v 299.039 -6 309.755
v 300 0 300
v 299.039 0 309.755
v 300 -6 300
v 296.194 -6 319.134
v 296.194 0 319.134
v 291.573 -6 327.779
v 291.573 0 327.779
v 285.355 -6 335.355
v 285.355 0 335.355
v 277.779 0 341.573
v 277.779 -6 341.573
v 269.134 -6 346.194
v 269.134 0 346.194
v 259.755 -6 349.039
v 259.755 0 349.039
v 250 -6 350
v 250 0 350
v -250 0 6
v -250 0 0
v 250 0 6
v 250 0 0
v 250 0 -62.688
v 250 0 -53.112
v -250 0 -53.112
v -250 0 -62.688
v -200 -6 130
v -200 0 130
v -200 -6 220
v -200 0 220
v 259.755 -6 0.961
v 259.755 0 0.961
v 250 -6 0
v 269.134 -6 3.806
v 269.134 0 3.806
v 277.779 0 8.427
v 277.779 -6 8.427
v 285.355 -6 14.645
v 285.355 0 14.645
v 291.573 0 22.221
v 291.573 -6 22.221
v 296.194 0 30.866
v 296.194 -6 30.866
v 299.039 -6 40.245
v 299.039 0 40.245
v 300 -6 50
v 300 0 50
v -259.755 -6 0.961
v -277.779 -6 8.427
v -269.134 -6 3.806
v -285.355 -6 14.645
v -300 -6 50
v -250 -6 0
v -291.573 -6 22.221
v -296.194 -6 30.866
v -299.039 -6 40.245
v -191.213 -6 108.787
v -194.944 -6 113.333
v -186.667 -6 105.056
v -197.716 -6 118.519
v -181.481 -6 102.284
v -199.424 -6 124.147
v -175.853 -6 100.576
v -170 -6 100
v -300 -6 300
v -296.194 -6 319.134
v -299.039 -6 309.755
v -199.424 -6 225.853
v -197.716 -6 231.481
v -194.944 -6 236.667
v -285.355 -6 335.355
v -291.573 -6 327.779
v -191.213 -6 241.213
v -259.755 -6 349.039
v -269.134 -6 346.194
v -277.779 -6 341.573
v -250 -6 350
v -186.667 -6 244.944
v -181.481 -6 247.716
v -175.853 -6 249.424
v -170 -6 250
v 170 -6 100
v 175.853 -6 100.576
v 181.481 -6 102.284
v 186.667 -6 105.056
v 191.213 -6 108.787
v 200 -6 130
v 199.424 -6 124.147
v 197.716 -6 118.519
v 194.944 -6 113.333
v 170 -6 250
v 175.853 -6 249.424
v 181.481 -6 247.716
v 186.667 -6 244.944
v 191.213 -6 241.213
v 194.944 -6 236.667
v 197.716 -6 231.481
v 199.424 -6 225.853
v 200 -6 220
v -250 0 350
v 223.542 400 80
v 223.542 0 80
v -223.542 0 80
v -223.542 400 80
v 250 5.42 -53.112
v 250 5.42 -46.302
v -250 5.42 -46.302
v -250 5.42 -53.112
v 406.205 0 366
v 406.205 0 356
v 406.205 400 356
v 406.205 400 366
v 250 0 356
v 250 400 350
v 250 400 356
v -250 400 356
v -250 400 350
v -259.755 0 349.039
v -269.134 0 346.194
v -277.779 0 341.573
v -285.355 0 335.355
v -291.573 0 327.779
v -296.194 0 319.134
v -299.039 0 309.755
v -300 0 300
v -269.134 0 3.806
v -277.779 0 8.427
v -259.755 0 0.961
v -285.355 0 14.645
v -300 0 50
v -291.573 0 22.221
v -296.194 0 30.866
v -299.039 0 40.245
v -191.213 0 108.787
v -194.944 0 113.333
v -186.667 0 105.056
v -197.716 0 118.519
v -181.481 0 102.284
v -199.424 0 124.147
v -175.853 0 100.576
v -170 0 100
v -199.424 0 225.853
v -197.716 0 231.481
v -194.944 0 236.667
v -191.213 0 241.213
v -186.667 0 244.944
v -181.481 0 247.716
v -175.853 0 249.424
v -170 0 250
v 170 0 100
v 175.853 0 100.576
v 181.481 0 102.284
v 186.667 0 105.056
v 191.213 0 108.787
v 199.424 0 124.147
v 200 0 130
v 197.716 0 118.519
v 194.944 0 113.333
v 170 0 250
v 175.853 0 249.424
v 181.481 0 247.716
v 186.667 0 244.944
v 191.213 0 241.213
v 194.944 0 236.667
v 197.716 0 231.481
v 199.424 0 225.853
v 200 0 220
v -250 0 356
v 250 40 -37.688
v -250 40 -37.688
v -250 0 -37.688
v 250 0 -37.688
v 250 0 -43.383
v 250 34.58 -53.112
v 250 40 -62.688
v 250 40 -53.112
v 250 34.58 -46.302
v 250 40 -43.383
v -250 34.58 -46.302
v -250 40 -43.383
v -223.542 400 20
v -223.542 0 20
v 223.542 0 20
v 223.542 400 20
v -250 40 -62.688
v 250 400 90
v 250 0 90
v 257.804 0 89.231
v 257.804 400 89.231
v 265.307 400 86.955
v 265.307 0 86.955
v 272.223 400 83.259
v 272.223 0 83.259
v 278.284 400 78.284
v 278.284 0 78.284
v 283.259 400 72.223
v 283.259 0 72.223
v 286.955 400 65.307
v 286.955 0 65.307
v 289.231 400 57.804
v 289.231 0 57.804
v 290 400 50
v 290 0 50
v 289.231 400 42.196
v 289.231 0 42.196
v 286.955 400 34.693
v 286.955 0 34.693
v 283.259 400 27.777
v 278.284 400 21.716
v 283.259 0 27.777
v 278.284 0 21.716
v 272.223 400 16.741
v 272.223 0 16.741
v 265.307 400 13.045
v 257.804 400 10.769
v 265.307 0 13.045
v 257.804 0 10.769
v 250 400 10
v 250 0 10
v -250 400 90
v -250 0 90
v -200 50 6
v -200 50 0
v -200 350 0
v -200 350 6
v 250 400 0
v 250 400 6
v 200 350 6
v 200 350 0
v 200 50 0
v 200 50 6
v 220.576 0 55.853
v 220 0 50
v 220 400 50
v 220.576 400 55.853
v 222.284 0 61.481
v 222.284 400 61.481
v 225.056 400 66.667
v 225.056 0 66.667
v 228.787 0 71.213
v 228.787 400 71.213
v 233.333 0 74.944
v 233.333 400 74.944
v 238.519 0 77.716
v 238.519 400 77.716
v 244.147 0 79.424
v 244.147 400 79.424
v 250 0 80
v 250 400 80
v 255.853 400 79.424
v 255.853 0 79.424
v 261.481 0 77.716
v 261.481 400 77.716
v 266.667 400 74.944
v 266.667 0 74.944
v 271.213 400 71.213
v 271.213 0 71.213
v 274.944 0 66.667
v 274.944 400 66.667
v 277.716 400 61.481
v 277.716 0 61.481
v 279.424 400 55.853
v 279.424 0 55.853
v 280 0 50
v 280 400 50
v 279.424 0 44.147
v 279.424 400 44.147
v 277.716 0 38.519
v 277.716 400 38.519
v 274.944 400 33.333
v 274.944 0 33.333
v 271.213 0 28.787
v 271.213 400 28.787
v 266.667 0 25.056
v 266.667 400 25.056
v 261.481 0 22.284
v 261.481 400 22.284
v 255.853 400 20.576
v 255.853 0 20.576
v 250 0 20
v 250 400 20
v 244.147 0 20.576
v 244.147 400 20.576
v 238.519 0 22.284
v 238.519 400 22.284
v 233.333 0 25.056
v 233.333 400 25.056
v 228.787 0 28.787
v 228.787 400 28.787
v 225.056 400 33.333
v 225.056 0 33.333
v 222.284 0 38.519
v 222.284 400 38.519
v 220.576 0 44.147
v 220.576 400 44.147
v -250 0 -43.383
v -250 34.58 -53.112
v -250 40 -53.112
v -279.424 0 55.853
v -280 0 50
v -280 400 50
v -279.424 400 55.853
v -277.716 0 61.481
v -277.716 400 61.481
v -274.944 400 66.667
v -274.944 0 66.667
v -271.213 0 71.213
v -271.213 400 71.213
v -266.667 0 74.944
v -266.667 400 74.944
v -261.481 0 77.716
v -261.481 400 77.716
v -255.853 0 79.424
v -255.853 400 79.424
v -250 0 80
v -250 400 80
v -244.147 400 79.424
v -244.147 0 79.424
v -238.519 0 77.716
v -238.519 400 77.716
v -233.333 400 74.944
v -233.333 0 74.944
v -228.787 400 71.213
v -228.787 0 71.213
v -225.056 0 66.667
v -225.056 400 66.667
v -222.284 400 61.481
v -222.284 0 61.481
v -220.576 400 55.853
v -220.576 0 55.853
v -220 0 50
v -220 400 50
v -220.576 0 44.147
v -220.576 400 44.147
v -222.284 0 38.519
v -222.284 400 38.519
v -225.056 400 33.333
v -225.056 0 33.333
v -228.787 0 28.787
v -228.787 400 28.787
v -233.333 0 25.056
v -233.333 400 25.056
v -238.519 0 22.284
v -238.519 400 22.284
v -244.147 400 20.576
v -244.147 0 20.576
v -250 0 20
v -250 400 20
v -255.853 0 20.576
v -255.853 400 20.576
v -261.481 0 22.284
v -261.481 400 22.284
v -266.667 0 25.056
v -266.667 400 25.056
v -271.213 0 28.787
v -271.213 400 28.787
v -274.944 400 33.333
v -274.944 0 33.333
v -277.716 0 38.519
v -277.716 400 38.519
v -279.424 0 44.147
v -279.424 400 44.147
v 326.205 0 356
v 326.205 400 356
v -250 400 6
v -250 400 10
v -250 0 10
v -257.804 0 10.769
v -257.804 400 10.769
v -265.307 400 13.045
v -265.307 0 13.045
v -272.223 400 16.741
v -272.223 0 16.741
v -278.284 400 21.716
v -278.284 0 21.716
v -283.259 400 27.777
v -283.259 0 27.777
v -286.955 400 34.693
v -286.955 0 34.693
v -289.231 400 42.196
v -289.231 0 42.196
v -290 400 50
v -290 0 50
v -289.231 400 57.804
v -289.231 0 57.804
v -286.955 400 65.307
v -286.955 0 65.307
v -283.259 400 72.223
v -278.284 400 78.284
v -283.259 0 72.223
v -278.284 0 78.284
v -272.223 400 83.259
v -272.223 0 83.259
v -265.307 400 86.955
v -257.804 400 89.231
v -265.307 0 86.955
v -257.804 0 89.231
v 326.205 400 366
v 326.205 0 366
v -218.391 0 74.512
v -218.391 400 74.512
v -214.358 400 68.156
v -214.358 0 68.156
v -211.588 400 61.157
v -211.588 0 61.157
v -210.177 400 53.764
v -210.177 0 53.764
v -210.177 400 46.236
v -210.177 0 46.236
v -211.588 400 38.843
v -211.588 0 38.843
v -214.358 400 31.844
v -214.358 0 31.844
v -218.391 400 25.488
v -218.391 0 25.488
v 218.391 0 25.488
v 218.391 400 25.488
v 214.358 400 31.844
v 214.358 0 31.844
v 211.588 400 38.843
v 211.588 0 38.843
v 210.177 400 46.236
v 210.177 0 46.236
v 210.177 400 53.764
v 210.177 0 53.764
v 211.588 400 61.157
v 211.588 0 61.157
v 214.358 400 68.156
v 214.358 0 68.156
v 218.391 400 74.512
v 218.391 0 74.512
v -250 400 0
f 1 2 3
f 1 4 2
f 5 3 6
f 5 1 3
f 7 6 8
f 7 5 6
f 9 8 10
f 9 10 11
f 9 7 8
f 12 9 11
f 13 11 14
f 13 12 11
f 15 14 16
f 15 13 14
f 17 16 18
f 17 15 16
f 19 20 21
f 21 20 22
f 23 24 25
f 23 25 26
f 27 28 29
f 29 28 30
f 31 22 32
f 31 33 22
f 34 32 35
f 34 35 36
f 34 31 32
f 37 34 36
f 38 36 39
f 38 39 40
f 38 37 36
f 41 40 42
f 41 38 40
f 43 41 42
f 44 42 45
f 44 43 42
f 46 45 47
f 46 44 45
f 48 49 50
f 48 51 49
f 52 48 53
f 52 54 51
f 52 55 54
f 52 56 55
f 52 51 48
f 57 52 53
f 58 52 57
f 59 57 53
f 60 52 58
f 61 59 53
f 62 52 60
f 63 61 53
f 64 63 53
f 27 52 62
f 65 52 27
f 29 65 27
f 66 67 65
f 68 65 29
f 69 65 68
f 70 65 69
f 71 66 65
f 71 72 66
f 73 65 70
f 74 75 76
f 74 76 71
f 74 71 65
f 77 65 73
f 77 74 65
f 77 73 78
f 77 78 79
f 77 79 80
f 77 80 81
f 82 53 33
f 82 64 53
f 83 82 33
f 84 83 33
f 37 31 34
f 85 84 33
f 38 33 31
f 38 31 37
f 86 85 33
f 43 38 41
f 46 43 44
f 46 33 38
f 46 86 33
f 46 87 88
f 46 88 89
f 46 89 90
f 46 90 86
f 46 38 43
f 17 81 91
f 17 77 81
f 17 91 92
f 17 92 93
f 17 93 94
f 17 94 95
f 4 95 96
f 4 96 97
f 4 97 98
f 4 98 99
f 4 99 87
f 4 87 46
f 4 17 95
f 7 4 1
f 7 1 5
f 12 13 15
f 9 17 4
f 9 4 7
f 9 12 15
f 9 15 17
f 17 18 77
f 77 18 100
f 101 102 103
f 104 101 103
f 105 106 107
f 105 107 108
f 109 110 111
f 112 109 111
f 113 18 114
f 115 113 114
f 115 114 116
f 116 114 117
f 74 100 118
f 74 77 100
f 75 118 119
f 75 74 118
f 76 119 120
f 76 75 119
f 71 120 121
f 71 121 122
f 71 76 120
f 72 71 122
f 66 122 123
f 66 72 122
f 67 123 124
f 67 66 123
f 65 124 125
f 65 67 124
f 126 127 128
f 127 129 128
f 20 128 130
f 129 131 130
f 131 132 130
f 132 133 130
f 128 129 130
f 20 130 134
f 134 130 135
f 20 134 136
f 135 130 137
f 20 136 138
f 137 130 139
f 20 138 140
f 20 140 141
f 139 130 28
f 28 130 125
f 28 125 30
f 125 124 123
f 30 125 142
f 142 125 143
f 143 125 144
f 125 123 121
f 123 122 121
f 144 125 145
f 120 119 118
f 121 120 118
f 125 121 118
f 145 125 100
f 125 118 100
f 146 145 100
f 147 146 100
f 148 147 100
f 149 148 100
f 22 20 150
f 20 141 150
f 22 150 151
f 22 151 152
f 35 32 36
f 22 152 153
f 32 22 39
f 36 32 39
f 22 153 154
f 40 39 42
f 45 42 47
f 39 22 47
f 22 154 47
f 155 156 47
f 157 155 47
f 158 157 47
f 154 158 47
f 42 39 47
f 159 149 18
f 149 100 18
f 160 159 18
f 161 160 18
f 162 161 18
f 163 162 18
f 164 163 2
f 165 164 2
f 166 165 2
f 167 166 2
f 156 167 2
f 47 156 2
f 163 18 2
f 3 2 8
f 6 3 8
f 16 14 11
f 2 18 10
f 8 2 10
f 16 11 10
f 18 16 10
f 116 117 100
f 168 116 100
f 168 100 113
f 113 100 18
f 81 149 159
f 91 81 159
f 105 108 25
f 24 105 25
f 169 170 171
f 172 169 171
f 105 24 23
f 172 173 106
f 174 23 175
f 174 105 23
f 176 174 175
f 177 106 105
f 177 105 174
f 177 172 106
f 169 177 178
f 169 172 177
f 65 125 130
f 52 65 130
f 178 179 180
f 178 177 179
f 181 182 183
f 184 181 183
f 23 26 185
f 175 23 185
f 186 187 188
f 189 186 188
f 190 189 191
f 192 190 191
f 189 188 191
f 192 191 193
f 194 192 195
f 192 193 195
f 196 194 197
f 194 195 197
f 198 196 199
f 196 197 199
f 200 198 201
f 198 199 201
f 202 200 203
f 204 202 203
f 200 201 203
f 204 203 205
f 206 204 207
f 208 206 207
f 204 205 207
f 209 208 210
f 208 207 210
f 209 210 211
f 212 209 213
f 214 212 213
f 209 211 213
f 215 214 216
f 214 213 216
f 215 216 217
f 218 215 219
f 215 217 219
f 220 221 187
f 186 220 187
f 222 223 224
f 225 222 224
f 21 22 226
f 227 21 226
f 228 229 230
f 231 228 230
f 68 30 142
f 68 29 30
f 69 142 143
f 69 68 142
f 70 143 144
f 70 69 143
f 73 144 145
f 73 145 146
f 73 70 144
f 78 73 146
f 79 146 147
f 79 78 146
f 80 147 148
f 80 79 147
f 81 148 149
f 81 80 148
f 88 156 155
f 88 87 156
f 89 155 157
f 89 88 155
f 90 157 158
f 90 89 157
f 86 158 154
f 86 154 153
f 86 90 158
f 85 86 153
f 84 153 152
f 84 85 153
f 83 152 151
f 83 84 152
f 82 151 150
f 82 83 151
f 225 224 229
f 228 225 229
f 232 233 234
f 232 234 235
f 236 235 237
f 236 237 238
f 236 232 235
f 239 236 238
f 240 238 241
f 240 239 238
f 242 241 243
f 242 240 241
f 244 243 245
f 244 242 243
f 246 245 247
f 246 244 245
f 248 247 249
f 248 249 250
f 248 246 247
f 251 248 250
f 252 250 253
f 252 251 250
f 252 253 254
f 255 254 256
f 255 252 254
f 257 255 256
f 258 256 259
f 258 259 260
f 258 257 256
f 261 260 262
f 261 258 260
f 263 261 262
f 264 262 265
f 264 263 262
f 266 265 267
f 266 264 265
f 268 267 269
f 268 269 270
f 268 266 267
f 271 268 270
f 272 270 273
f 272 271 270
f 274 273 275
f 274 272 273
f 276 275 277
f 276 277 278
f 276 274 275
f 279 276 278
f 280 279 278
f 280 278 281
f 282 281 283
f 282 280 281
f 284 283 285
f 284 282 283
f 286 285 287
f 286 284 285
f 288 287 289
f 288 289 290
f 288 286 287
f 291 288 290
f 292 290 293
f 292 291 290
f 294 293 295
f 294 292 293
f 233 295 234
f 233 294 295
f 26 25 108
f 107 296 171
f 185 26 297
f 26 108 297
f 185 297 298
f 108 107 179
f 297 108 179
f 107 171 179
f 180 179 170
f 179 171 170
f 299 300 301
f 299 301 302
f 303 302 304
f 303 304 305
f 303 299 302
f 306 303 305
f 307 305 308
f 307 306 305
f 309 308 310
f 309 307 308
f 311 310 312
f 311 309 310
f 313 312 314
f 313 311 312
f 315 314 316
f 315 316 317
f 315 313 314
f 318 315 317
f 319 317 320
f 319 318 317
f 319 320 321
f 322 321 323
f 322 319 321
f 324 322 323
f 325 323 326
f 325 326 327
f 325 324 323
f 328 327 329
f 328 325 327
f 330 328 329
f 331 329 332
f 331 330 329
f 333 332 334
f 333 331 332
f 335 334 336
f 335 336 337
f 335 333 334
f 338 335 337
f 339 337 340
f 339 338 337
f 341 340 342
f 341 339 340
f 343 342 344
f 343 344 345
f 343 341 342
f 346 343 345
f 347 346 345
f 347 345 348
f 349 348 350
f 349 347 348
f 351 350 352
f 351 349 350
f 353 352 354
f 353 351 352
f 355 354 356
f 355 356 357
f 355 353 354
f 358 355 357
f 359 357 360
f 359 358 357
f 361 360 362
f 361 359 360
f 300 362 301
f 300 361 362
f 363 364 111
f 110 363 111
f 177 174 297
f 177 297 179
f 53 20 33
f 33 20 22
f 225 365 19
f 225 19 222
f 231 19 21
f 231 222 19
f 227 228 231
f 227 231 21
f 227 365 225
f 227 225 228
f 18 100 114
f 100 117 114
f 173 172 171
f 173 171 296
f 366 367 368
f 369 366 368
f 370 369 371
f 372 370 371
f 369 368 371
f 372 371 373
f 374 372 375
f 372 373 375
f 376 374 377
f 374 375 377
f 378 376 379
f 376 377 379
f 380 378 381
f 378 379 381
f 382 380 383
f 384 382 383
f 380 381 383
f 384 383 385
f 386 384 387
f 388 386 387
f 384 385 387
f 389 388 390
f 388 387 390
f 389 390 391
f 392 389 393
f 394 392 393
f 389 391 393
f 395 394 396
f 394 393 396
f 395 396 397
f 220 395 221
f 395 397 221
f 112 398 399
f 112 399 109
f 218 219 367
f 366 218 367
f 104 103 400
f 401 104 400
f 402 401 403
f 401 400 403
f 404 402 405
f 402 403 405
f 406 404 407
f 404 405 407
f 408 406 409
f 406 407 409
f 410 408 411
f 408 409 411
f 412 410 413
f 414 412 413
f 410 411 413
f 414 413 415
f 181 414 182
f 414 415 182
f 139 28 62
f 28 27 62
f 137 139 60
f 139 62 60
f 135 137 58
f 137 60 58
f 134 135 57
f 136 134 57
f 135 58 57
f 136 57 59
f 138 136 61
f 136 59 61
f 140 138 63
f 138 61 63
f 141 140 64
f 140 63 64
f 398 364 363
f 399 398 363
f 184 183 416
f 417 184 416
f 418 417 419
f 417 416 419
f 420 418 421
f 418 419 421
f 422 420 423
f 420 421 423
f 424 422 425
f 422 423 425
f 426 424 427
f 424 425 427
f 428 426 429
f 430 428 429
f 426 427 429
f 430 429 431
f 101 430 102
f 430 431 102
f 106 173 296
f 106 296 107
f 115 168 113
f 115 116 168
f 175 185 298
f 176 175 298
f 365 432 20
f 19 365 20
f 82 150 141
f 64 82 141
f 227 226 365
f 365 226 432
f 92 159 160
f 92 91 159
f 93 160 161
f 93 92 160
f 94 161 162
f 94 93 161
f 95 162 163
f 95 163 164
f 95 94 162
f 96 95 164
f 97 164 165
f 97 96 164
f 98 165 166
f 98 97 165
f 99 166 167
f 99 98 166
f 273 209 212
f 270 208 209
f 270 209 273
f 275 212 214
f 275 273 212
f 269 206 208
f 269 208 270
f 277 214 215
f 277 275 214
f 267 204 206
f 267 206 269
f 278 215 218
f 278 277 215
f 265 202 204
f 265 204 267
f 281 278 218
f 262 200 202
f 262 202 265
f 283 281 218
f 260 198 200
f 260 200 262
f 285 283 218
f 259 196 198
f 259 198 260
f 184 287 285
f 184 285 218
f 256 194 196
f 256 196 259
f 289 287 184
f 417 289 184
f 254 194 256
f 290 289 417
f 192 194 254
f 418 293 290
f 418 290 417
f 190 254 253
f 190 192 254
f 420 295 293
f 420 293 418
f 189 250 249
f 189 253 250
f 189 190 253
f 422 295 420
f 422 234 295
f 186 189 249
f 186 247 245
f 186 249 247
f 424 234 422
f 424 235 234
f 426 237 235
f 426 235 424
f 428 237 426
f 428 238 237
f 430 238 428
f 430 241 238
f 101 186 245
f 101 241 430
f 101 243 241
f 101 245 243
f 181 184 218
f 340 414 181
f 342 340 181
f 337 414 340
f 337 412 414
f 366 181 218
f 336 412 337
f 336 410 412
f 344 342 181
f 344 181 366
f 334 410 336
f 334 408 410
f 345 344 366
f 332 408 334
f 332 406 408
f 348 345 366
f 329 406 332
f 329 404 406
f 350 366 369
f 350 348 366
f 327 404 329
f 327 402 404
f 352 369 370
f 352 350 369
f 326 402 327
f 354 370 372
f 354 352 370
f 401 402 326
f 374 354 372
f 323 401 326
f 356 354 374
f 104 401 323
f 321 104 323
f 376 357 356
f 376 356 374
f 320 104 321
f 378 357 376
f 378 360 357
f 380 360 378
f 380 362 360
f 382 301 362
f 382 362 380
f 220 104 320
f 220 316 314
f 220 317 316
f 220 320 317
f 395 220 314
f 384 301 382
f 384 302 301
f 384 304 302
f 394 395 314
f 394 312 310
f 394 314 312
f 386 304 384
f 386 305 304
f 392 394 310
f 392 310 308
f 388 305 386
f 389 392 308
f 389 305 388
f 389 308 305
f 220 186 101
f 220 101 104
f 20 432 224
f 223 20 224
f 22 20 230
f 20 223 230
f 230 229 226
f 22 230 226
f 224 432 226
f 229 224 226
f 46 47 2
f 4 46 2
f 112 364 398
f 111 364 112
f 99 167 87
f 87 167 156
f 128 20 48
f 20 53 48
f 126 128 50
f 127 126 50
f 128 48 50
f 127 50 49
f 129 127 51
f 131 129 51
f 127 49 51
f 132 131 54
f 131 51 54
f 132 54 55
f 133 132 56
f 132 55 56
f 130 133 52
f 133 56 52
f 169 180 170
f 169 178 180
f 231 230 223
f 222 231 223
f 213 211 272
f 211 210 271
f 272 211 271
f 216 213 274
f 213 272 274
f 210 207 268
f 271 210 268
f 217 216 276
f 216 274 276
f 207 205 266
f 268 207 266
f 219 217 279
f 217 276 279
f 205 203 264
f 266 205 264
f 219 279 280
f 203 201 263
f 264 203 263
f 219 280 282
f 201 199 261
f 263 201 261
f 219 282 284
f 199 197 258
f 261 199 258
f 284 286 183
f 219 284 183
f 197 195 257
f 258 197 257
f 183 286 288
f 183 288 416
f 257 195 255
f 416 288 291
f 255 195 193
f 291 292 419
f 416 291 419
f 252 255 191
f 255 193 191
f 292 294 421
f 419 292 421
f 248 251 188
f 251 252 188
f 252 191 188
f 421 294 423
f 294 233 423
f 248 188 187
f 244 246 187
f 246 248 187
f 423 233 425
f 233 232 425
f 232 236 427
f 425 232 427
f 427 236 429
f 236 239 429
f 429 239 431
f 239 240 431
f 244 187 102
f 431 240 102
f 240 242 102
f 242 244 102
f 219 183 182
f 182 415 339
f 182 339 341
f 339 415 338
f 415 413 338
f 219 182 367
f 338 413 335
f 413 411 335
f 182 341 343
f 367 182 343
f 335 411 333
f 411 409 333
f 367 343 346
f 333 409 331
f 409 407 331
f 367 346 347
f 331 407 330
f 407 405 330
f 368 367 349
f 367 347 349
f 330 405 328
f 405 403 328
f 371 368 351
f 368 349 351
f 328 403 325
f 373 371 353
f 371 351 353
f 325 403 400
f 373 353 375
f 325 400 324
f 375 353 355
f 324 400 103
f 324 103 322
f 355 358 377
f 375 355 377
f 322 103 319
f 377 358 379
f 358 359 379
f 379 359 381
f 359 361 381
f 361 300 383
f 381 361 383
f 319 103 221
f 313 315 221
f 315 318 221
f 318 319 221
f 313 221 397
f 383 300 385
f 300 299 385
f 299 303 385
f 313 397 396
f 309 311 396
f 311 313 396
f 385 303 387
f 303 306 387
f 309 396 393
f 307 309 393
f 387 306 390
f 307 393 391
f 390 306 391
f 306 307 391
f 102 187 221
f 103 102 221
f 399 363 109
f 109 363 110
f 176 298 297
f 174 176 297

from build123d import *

# Parameters (mm, degrees)
F1_DEPTH       = 6
F2_R           = 50
F3_R           = 30
F5_DEPTH       = 6
F6_W           = 250
F6_H           = 200
F7_DEPTH       = 6
F8_R           = 30
F9_DEPTH       = 400
F11_DEPTH      = 250
F11_DEPTH_BACK = 250
F12_W          = 80
F12_H          = 200
F13_DEPTH      = 10


with BuildPart() as f1:
    # F0 (on Front) → F1 (new body)
    with BuildSketch(Plane.XZ):
        Polygon((-300, 0), (0, 0), (0, 100), (-200, 100), (-200, 250), (200, 250), (200, 175), (300, 175), (300, 350), (-300, 350), align=None)
        Polygon((0, 100), (0, 0), (300, 0), (300, 175), (200, 175), (200, 100), align=None)
    extrude(amount=F1_DEPTH)

    # F2
    f2_edges = [f1.edges().sort_by_distance(p)[0] for p in [
        (-300, -3, 350),
        (-300, -3, 0),
        (300, -3, 350),
        (300, -3, 0),
    ]]
    fillet(f2_edges, radius=F2_R)

    # F3
    f3_edges = [f1.edges().sort_by_distance(p)[0] for p in [
        (-200, -3, 250),
        (-200, -3, 100),
        (200, -3, 250),
        (200, -3, 100),
    ]]
    fillet(f3_edges, radius=F3_R)


with BuildPart() as f5:
    # F4 (on Top) → F5 (new body)
    with BuildSketch(Plane.XY):
        Polygon((-250, 0), (0, 0), (0, 50), (-200, 50), (-200, 350), (200, 350), (200, 200), (250, 200), (250, 400), (-250, 400), align=None)
        Polygon((0, 50), (0, 0), (250, 0), (250, 200), (200, 200), (200, 50), align=None)
    extrude(amount=F5_DEPTH)


with BuildPart() as f7:
    # F6 (on face) → F7 (new body)
    with BuildSketch(Plane.XY.offset(350)):
        Polygon((-250, 0), (0, 0), (0, 200), (250, 200), (250, 400), (-250, 400), align=None)
        with Locations((125, 100)):
            Rectangle(F6_W, F6_H)
    extrude(amount=F7_DEPTH)


with BuildPart() as f9:
    # F8 (on face) → F9 (new body)
    with BuildSketch(Plane(origin=(0, 0, 0), x_dir=(-1, 0, 0), z_dir=(0, 1, 0))):
        with BuildLine():
            Line((250, 90), (-250, 90))
            ThreePointArc((-250, 90), (-290, 50), (-250, 10))
            Line((-250, 10), (250, 10))
            ThreePointArc((250, 10), (290, 50), (250, 90))
        make_face()
        with Locations((-250, 50)):
            Circle(F8_R, mode=Mode.SUBTRACT)
        with BuildLine():
            Line((-223.542487, 80), (223.542487, 80))
            ThreePointArc((223.542487, 80), (210, 50), (223.542487, 20))
            Line((223.542487, 20), (-223.542487, 20))
            ThreePointArc((-223.542487, 20), (-210, 50), (-223.542487, 80))
        make_face(mode=Mode.SUBTRACT)
        with Locations((250, 50)):
            Circle(F8_R, mode=Mode.SUBTRACT)
    extrude(amount=F9_DEPTH)


with BuildPart() as f11:
    # F10 (on Right) → F11 (new body, two sides)
    with BuildSketch(Plane.YZ) as f11_sk:
        Polygon((40, -37.688328), (0, -37.688328), (0, -43.383155), (5.419665, -46.301808), (5.419665, -53.112), (0, -53.112), (0, -62.688328), (40, -62.688328), (40, -53.112), (34.580335, -53.112), (34.580335, -46.301808), (40, -43.383155), align=None)
    extrude(amount=F11_DEPTH)
    extrude(f11_sk.sketch, amount=-F11_DEPTH_BACK)


with BuildPart() as f13:
    # F12 (on face) → F13 (new body)
    with BuildSketch(Plane.XY.offset(356)):
        with Locations((366.204866, 300)):
            Rectangle(F12_W, F12_H)
        with Locations((366.204866, 100)):
            Rectangle(F12_W, F12_H)
    extrude(amount=F13_DEPTH)


solid = Compound([f1.part, f5.part, f7.part, f9.part, f11.part, f13.part])
